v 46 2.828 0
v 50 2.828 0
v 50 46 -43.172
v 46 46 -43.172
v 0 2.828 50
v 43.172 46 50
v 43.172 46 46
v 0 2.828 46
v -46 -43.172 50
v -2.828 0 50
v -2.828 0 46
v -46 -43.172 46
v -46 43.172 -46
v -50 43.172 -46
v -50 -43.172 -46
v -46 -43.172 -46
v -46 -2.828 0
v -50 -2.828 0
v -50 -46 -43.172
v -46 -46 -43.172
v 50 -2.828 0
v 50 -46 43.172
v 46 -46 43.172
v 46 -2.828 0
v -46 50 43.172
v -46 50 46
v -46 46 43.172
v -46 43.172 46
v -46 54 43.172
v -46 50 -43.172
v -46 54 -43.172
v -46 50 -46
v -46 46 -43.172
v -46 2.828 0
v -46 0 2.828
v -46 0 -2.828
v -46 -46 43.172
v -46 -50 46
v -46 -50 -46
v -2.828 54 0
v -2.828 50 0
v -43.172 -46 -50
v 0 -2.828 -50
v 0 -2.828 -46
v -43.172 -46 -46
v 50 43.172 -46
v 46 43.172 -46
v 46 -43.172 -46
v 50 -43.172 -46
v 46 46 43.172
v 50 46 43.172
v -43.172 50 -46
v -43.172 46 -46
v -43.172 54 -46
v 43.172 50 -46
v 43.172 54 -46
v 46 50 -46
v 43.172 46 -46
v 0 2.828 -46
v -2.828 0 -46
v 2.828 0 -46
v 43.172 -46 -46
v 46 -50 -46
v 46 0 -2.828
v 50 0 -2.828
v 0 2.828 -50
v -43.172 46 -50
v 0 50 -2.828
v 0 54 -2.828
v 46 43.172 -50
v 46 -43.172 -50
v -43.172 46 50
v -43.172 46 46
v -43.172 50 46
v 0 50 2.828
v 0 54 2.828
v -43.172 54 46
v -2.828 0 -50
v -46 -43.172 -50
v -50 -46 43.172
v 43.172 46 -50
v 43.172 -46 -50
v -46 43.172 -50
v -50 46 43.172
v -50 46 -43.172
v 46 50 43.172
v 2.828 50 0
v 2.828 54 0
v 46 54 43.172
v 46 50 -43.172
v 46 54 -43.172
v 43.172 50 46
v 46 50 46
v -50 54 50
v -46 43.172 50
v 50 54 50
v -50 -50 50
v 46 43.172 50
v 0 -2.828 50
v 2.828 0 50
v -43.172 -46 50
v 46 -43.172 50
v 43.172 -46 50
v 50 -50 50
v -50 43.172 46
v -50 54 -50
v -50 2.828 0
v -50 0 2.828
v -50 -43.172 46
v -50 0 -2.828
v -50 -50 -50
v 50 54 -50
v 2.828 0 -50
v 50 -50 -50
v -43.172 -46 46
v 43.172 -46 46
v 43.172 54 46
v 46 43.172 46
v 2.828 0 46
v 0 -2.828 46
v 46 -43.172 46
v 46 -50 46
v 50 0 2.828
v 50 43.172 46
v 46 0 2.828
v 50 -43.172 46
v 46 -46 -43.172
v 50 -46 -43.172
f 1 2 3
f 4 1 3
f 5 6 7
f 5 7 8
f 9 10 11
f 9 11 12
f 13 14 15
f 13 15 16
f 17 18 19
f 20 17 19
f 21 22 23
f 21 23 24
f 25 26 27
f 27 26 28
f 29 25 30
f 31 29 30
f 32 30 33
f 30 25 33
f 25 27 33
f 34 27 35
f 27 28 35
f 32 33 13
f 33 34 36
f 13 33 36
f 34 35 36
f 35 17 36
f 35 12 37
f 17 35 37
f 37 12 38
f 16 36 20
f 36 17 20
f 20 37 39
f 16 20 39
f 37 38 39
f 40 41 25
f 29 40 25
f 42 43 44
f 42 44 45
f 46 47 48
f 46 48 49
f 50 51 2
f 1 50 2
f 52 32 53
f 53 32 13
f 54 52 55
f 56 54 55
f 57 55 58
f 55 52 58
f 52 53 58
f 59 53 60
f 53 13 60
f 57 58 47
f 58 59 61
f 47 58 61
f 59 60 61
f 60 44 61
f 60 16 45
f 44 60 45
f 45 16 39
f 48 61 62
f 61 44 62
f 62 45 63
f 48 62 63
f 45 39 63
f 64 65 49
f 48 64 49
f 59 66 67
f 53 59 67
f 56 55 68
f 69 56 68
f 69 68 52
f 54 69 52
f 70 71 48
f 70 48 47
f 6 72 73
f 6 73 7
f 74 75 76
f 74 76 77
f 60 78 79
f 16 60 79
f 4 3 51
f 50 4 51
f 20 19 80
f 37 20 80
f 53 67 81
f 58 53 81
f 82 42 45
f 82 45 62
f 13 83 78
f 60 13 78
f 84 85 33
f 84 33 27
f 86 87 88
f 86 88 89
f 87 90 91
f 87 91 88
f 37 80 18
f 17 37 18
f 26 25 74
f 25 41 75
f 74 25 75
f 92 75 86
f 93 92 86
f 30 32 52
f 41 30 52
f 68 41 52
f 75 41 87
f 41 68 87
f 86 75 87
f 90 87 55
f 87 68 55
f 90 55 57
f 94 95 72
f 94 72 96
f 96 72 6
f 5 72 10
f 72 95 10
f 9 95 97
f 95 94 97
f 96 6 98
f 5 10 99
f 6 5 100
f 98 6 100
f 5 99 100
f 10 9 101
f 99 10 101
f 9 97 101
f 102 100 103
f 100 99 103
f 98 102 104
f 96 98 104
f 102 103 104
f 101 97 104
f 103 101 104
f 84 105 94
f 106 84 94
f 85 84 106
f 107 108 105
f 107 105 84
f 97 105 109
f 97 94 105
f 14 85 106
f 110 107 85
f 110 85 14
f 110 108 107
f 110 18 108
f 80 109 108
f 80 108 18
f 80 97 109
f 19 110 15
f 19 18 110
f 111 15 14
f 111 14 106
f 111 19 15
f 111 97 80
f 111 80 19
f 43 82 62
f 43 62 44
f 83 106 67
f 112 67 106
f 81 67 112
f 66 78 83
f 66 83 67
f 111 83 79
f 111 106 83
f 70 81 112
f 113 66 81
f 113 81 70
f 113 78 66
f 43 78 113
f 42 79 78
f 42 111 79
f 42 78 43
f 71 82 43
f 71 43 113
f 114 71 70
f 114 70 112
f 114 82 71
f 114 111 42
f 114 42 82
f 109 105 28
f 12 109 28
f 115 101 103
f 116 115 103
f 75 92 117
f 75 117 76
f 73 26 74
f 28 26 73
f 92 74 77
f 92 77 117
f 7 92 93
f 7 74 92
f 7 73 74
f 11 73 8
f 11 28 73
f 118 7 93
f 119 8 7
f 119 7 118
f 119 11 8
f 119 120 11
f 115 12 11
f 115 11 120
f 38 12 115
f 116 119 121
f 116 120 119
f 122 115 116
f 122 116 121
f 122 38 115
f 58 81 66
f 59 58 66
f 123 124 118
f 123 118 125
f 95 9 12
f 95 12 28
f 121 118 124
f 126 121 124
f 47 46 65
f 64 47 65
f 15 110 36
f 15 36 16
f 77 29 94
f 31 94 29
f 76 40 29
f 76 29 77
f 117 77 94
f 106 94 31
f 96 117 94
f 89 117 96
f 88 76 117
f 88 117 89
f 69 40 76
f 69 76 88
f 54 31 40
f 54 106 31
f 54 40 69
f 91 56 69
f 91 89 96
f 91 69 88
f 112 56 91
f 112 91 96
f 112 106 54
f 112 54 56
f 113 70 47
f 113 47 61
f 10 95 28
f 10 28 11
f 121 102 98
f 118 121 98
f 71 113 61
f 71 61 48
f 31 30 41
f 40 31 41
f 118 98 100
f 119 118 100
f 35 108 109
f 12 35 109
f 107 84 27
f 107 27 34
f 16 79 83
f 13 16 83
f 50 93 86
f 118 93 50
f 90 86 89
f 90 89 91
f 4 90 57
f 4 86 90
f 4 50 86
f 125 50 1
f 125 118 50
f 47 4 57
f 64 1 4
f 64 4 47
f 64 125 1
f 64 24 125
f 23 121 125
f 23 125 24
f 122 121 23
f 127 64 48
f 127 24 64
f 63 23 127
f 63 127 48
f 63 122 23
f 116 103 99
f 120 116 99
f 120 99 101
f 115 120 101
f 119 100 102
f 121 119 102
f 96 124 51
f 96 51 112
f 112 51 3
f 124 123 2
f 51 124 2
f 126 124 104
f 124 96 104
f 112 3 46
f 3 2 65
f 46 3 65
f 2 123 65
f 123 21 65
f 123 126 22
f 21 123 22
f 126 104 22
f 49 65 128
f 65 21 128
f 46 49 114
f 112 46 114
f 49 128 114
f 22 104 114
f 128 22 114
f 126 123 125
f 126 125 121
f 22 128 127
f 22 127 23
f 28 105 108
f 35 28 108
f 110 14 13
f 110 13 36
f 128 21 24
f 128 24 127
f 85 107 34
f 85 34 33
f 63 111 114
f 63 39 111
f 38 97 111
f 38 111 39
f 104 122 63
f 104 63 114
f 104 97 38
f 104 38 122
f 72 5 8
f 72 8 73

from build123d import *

# Parameters (mm, degrees)
SKETCH1_W           = 100
SKETCH1_H           = 100
BOSS_EXTRUDE1_DEPTH = 4
SKETCH9_W           = 100
SKETCH9_H           = 100
BOSS_EXTRUDE2_DEPTH = 4
SKETCH10_W          = 100
SKETCH10_H          = 100
BOSS_EXTRUDE3_DEPTH = 4


with BuildPart() as part:
    # Sketch1 → Boss-Extrude1 (new body)
    with BuildSketch(Plane.XY.offset(50)):
        Rectangle(SKETCH1_W, SKETCH1_H)
        Polygon((-43.171572875, 46), (43.171572875, 46), (0, 2.828427125), align=None, mode=Mode.SUBTRACT)
        Polygon((46, -43.171572875), (46, 43.171572875), (2.828427125, 0), align=None, mode=Mode.SUBTRACT)
        Polygon((-43.171572875, -46), (43.171572875, -46), (0, -2.828427125), align=None, mode=Mode.SUBTRACT)
        Polygon((-46, -43.171572875), (-46, 43.171572875), (-2.828427125, 0), align=None, mode=Mode.SUBTRACT)
    extrude(amount=-BOSS_EXTRUDE1_DEPTH)


with BuildPart() as body_2:
    # Mirror2: mirrored copy
    add(part.part.mirror(Plane.XY))


with BuildPart() as part_1:
    add(part.part)

    add(body_2.part)  # Boss-Extrude2 merges body 2
    # Sketch9 → Boss-Extrude2 (add)
    with BuildSketch(Plane(origin=(50, 0, 0), x_dir=(0, 0, -1), z_dir=(1, 0, 0))):
        Rectangle(SKETCH9_W, SKETCH9_H)
        Polygon((43.171572875, 46), (-43.171572875, 46), (0, 2.828427125), align=None, mode=Mode.SUBTRACT)
        Polygon((-46, -43.171572875), (-46, 43.171572875), (-2.828427125, 0), align=None, mode=Mode.SUBTRACT)
        Polygon((43.171572875, -46), (-43.171572875, -46), (0, -2.828427125), align=None, mode=Mode.SUBTRACT)
        Polygon((46, -43.171572875), (46, 43.171572875), (2.828427125, 0), align=None, mode=Mode.SUBTRACT)
    boss_extrude2 = extrude(amount=-BOSS_EXTRUDE2_DEPTH)

    # Mirror3: Boss-Extrude2 across plane
    add(boss_extrude2.mirror(Plane(origin=(0, 0, 0), x_dir=(0, 0, 1), z_dir=(1, 0, 0))))

    # Sketch10 → Boss-Extrude3 (add)
    with BuildSketch(Plane(origin=(0, 50, 0), x_dir=(1, 0, 0), z_dir=(0, 1, 0))):
        Rectangle(SKETCH10_W, SKETCH10_H)
        Polygon((-46, -43.171572875), (-46, 43.171572875), (-2.828427125, 0), align=None, mode=Mode.SUBTRACT)
        Polygon((-43.171572875, 46), (43.171572875, 46), (0, 2.828427125), align=None, mode=Mode.SUBTRACT)
        Polygon((46, -43.171572875), (46, 43.171572875), (2.828427125, 0), align=None, mode=Mode.SUBTRACT)
        Polygon((-43.171572875, -46), (43.171572875, -46), (0, -2.828427125), align=None, mode=Mode.SUBTRACT)
    extrude(amount=BOSS_EXTRUDE3_DEPTH)


solid = part_1.part
